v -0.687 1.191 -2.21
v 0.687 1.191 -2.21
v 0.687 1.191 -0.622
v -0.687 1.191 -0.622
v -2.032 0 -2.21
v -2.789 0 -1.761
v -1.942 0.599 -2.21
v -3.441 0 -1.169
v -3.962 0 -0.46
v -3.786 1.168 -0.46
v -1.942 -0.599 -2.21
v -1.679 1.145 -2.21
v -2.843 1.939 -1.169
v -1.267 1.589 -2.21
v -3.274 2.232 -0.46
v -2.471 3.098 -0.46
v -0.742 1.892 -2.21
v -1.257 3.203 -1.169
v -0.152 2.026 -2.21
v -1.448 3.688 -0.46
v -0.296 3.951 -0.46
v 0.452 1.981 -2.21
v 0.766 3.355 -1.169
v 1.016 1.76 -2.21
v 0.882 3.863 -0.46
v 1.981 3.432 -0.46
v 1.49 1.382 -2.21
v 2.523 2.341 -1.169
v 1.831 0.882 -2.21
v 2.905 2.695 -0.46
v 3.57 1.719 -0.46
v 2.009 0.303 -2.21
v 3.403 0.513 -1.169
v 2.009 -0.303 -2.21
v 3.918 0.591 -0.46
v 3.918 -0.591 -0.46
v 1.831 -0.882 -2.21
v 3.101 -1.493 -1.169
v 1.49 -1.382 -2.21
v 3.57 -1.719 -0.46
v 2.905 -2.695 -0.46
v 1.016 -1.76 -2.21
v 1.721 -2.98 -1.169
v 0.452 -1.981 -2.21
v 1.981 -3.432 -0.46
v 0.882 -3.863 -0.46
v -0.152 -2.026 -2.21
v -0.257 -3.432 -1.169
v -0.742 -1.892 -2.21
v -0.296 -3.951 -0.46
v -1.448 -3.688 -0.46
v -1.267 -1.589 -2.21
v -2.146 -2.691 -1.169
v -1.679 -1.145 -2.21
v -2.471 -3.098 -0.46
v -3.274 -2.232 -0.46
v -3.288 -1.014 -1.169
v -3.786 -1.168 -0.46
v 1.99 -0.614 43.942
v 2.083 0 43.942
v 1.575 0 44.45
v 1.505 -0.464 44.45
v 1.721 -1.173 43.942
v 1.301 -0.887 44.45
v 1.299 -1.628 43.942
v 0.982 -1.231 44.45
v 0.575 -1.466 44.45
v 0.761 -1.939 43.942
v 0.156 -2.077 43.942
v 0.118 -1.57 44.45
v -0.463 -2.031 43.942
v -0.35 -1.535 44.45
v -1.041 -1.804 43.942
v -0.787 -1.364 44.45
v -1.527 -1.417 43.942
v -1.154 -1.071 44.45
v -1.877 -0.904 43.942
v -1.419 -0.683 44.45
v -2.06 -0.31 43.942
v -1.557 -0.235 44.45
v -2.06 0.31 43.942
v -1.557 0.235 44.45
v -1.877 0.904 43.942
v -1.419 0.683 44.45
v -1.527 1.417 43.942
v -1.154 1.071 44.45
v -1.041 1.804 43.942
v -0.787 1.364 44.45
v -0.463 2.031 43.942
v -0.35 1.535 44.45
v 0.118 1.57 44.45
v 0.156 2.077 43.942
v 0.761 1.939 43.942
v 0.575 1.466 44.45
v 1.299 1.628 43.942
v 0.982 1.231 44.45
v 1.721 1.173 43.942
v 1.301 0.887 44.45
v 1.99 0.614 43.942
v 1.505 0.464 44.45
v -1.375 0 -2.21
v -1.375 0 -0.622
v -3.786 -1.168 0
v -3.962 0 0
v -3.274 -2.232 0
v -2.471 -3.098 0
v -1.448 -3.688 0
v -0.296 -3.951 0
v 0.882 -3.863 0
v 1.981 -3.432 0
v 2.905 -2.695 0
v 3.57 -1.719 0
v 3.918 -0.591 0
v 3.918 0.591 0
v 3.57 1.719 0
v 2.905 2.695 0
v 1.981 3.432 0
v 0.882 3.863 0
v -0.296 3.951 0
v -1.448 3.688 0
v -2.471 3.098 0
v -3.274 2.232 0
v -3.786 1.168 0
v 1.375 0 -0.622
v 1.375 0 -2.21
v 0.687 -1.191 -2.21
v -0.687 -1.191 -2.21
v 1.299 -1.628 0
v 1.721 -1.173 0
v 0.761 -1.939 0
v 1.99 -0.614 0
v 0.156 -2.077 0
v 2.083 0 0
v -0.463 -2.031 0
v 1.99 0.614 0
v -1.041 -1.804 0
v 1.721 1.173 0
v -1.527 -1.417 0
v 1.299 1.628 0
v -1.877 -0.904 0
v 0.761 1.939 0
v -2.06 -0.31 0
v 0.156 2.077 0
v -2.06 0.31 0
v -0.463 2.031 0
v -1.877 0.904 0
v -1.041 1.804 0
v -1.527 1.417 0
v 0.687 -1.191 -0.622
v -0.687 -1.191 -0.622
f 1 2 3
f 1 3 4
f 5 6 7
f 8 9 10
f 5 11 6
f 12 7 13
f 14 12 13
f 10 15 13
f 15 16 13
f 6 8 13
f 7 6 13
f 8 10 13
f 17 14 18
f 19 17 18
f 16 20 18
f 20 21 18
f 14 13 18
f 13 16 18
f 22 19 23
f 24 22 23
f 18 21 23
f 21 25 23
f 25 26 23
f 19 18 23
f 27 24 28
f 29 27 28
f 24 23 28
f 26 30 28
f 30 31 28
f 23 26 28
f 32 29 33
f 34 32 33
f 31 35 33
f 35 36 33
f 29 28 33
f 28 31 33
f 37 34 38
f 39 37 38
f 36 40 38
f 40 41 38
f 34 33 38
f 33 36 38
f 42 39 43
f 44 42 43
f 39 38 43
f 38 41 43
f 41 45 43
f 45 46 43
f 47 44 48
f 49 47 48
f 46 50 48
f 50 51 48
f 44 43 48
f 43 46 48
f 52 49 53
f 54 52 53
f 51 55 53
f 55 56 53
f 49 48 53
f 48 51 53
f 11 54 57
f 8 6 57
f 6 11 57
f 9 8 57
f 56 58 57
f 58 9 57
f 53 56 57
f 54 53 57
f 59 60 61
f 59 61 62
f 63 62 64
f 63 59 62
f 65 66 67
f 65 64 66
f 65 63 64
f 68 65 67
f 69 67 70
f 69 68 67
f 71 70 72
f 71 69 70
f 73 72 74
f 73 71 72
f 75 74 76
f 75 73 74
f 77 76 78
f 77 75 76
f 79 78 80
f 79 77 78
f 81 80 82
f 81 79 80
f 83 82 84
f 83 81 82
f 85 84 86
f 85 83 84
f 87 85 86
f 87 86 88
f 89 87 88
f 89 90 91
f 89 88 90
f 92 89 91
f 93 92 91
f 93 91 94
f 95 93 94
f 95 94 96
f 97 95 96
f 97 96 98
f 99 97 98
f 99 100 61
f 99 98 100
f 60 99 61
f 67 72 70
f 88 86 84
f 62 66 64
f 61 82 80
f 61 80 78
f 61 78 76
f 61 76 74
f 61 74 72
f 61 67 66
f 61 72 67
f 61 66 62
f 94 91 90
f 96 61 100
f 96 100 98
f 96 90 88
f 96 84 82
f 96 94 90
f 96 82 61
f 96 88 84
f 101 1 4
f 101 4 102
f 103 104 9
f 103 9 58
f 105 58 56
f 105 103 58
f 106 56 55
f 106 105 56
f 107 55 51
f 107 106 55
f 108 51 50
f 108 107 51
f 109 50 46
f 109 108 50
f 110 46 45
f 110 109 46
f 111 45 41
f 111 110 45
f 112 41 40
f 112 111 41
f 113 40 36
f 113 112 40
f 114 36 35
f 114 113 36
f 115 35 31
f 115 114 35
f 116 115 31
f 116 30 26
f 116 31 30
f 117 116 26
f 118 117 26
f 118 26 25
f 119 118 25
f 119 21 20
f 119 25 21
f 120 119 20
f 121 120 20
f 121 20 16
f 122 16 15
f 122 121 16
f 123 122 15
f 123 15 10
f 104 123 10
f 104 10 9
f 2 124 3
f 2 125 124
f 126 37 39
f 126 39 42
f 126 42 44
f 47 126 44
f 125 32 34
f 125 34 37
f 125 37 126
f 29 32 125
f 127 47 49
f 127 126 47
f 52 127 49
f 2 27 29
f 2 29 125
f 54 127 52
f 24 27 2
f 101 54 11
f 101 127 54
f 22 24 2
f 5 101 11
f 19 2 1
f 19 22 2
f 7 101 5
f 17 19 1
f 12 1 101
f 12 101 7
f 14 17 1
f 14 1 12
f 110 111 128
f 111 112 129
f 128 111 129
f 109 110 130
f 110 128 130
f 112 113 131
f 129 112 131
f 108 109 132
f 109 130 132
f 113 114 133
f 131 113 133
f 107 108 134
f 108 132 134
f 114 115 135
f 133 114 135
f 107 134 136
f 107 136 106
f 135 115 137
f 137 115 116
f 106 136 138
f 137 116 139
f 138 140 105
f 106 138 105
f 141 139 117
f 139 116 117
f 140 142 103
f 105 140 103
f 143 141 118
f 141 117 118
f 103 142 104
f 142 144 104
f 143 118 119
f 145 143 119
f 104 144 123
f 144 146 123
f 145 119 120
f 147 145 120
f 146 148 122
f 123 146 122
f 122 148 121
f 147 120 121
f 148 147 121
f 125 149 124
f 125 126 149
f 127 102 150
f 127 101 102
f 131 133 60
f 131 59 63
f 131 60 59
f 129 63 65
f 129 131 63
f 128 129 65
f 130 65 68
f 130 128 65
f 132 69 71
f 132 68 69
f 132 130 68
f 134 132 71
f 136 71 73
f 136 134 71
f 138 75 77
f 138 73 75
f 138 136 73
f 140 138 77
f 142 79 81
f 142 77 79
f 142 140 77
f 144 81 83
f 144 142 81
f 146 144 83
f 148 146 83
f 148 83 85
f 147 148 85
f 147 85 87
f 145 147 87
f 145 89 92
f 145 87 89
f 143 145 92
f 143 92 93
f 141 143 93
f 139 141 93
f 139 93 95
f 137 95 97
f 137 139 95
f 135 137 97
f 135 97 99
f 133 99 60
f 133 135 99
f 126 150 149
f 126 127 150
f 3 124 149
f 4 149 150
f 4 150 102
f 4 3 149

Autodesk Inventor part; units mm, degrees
ref_plane "YZ Plane" through (0, 0, 0) normal (1, 0, 0) x (0, 1, 0)
ref_plane "XZ Plane" through (0, 0, 0) normal (0, 1, 0) x (-1, 0, 0)
ref_plane "XY Plane" through (0, 0, 0) normal (0, 0, 1) x (1, 0, 0)
sketch "Sketch1" plane through (0, 0, 0) normal (0, 0, 1) x (1, 0, 0)
  circle A0 centre (0, 0) radius 2.0828
  dimension "d0" = 4.1656
extrude "Extrusion1" add sketch "Sketch1" along normal blind 44.45
sketch "Sketch2" plane through (0, 0, 0) normal (0, 1, 0) x (-1, 0, 0)
  line L0 (0, 0) -> (0, -2.2098)
  line L1 (0, 0) -> (3.9624, 0)
  line L2 (0, -2.2098) -> (2.032, -2.2098)
  line L3 (3.9624, 0) -> (3.9624, 3.6562) construction
  arc A0 (2.032, -2.2098) -> (3.9624, -0.4599) centre (0.1837, 1.7689) ccw
  line L4 (4.5847, 0.6553) -> (4.5847, -0.2608) construction
  line L5 (3.9624, -0.4599) -> (3.9624, 0)
  dimension "d3" = 2.2098
  dimension "d6" = 2.032
  dimension "d19" = 3.9624
revolve "Revolution1" add sketch "Sketch2" angle 360 about axis through (0, 0, 0) along (0, 0, -1)
sketch "Sketch3" plane through (0, 0, -2.2098) normal (0, 0, -1) x (-1, 0, 0)
  circle A0 centre (0, 0) radius 2.032 projected
  line L0 (-0.6874, 1.1906) -> (0.6874, 1.1906)
  line L1 (0.6874, 1.1906) -> (1.3748, 0)
  line L2 (1.3748, 0) -> (0.6874, -1.1906)
  line L3 (0.6874, -1.1906) -> (-0.6874, -1.1906)
  line L4 (-0.6874, -1.1906) -> (-1.3748, 0)
  line L5 (-1.3748, 0) -> (-0.6874, 1.1906)
  dimension "d8" = 2.3813
extrude "Extrusion2" cut sketch "Sketch3" against normal blind 1.5875 contours L0 L1 L2 L3 L4 L5
chamfer "Chamfer1" distance 0.508 angle 45 1 edges at (-2.0828, 0, 44.45)
thread "Thread1" size "8-32 UNC" class "2A" standard "ANSI Unified Screw Threads" length 25.4
properties part number "10-32 x500 button head" material "Steel"
